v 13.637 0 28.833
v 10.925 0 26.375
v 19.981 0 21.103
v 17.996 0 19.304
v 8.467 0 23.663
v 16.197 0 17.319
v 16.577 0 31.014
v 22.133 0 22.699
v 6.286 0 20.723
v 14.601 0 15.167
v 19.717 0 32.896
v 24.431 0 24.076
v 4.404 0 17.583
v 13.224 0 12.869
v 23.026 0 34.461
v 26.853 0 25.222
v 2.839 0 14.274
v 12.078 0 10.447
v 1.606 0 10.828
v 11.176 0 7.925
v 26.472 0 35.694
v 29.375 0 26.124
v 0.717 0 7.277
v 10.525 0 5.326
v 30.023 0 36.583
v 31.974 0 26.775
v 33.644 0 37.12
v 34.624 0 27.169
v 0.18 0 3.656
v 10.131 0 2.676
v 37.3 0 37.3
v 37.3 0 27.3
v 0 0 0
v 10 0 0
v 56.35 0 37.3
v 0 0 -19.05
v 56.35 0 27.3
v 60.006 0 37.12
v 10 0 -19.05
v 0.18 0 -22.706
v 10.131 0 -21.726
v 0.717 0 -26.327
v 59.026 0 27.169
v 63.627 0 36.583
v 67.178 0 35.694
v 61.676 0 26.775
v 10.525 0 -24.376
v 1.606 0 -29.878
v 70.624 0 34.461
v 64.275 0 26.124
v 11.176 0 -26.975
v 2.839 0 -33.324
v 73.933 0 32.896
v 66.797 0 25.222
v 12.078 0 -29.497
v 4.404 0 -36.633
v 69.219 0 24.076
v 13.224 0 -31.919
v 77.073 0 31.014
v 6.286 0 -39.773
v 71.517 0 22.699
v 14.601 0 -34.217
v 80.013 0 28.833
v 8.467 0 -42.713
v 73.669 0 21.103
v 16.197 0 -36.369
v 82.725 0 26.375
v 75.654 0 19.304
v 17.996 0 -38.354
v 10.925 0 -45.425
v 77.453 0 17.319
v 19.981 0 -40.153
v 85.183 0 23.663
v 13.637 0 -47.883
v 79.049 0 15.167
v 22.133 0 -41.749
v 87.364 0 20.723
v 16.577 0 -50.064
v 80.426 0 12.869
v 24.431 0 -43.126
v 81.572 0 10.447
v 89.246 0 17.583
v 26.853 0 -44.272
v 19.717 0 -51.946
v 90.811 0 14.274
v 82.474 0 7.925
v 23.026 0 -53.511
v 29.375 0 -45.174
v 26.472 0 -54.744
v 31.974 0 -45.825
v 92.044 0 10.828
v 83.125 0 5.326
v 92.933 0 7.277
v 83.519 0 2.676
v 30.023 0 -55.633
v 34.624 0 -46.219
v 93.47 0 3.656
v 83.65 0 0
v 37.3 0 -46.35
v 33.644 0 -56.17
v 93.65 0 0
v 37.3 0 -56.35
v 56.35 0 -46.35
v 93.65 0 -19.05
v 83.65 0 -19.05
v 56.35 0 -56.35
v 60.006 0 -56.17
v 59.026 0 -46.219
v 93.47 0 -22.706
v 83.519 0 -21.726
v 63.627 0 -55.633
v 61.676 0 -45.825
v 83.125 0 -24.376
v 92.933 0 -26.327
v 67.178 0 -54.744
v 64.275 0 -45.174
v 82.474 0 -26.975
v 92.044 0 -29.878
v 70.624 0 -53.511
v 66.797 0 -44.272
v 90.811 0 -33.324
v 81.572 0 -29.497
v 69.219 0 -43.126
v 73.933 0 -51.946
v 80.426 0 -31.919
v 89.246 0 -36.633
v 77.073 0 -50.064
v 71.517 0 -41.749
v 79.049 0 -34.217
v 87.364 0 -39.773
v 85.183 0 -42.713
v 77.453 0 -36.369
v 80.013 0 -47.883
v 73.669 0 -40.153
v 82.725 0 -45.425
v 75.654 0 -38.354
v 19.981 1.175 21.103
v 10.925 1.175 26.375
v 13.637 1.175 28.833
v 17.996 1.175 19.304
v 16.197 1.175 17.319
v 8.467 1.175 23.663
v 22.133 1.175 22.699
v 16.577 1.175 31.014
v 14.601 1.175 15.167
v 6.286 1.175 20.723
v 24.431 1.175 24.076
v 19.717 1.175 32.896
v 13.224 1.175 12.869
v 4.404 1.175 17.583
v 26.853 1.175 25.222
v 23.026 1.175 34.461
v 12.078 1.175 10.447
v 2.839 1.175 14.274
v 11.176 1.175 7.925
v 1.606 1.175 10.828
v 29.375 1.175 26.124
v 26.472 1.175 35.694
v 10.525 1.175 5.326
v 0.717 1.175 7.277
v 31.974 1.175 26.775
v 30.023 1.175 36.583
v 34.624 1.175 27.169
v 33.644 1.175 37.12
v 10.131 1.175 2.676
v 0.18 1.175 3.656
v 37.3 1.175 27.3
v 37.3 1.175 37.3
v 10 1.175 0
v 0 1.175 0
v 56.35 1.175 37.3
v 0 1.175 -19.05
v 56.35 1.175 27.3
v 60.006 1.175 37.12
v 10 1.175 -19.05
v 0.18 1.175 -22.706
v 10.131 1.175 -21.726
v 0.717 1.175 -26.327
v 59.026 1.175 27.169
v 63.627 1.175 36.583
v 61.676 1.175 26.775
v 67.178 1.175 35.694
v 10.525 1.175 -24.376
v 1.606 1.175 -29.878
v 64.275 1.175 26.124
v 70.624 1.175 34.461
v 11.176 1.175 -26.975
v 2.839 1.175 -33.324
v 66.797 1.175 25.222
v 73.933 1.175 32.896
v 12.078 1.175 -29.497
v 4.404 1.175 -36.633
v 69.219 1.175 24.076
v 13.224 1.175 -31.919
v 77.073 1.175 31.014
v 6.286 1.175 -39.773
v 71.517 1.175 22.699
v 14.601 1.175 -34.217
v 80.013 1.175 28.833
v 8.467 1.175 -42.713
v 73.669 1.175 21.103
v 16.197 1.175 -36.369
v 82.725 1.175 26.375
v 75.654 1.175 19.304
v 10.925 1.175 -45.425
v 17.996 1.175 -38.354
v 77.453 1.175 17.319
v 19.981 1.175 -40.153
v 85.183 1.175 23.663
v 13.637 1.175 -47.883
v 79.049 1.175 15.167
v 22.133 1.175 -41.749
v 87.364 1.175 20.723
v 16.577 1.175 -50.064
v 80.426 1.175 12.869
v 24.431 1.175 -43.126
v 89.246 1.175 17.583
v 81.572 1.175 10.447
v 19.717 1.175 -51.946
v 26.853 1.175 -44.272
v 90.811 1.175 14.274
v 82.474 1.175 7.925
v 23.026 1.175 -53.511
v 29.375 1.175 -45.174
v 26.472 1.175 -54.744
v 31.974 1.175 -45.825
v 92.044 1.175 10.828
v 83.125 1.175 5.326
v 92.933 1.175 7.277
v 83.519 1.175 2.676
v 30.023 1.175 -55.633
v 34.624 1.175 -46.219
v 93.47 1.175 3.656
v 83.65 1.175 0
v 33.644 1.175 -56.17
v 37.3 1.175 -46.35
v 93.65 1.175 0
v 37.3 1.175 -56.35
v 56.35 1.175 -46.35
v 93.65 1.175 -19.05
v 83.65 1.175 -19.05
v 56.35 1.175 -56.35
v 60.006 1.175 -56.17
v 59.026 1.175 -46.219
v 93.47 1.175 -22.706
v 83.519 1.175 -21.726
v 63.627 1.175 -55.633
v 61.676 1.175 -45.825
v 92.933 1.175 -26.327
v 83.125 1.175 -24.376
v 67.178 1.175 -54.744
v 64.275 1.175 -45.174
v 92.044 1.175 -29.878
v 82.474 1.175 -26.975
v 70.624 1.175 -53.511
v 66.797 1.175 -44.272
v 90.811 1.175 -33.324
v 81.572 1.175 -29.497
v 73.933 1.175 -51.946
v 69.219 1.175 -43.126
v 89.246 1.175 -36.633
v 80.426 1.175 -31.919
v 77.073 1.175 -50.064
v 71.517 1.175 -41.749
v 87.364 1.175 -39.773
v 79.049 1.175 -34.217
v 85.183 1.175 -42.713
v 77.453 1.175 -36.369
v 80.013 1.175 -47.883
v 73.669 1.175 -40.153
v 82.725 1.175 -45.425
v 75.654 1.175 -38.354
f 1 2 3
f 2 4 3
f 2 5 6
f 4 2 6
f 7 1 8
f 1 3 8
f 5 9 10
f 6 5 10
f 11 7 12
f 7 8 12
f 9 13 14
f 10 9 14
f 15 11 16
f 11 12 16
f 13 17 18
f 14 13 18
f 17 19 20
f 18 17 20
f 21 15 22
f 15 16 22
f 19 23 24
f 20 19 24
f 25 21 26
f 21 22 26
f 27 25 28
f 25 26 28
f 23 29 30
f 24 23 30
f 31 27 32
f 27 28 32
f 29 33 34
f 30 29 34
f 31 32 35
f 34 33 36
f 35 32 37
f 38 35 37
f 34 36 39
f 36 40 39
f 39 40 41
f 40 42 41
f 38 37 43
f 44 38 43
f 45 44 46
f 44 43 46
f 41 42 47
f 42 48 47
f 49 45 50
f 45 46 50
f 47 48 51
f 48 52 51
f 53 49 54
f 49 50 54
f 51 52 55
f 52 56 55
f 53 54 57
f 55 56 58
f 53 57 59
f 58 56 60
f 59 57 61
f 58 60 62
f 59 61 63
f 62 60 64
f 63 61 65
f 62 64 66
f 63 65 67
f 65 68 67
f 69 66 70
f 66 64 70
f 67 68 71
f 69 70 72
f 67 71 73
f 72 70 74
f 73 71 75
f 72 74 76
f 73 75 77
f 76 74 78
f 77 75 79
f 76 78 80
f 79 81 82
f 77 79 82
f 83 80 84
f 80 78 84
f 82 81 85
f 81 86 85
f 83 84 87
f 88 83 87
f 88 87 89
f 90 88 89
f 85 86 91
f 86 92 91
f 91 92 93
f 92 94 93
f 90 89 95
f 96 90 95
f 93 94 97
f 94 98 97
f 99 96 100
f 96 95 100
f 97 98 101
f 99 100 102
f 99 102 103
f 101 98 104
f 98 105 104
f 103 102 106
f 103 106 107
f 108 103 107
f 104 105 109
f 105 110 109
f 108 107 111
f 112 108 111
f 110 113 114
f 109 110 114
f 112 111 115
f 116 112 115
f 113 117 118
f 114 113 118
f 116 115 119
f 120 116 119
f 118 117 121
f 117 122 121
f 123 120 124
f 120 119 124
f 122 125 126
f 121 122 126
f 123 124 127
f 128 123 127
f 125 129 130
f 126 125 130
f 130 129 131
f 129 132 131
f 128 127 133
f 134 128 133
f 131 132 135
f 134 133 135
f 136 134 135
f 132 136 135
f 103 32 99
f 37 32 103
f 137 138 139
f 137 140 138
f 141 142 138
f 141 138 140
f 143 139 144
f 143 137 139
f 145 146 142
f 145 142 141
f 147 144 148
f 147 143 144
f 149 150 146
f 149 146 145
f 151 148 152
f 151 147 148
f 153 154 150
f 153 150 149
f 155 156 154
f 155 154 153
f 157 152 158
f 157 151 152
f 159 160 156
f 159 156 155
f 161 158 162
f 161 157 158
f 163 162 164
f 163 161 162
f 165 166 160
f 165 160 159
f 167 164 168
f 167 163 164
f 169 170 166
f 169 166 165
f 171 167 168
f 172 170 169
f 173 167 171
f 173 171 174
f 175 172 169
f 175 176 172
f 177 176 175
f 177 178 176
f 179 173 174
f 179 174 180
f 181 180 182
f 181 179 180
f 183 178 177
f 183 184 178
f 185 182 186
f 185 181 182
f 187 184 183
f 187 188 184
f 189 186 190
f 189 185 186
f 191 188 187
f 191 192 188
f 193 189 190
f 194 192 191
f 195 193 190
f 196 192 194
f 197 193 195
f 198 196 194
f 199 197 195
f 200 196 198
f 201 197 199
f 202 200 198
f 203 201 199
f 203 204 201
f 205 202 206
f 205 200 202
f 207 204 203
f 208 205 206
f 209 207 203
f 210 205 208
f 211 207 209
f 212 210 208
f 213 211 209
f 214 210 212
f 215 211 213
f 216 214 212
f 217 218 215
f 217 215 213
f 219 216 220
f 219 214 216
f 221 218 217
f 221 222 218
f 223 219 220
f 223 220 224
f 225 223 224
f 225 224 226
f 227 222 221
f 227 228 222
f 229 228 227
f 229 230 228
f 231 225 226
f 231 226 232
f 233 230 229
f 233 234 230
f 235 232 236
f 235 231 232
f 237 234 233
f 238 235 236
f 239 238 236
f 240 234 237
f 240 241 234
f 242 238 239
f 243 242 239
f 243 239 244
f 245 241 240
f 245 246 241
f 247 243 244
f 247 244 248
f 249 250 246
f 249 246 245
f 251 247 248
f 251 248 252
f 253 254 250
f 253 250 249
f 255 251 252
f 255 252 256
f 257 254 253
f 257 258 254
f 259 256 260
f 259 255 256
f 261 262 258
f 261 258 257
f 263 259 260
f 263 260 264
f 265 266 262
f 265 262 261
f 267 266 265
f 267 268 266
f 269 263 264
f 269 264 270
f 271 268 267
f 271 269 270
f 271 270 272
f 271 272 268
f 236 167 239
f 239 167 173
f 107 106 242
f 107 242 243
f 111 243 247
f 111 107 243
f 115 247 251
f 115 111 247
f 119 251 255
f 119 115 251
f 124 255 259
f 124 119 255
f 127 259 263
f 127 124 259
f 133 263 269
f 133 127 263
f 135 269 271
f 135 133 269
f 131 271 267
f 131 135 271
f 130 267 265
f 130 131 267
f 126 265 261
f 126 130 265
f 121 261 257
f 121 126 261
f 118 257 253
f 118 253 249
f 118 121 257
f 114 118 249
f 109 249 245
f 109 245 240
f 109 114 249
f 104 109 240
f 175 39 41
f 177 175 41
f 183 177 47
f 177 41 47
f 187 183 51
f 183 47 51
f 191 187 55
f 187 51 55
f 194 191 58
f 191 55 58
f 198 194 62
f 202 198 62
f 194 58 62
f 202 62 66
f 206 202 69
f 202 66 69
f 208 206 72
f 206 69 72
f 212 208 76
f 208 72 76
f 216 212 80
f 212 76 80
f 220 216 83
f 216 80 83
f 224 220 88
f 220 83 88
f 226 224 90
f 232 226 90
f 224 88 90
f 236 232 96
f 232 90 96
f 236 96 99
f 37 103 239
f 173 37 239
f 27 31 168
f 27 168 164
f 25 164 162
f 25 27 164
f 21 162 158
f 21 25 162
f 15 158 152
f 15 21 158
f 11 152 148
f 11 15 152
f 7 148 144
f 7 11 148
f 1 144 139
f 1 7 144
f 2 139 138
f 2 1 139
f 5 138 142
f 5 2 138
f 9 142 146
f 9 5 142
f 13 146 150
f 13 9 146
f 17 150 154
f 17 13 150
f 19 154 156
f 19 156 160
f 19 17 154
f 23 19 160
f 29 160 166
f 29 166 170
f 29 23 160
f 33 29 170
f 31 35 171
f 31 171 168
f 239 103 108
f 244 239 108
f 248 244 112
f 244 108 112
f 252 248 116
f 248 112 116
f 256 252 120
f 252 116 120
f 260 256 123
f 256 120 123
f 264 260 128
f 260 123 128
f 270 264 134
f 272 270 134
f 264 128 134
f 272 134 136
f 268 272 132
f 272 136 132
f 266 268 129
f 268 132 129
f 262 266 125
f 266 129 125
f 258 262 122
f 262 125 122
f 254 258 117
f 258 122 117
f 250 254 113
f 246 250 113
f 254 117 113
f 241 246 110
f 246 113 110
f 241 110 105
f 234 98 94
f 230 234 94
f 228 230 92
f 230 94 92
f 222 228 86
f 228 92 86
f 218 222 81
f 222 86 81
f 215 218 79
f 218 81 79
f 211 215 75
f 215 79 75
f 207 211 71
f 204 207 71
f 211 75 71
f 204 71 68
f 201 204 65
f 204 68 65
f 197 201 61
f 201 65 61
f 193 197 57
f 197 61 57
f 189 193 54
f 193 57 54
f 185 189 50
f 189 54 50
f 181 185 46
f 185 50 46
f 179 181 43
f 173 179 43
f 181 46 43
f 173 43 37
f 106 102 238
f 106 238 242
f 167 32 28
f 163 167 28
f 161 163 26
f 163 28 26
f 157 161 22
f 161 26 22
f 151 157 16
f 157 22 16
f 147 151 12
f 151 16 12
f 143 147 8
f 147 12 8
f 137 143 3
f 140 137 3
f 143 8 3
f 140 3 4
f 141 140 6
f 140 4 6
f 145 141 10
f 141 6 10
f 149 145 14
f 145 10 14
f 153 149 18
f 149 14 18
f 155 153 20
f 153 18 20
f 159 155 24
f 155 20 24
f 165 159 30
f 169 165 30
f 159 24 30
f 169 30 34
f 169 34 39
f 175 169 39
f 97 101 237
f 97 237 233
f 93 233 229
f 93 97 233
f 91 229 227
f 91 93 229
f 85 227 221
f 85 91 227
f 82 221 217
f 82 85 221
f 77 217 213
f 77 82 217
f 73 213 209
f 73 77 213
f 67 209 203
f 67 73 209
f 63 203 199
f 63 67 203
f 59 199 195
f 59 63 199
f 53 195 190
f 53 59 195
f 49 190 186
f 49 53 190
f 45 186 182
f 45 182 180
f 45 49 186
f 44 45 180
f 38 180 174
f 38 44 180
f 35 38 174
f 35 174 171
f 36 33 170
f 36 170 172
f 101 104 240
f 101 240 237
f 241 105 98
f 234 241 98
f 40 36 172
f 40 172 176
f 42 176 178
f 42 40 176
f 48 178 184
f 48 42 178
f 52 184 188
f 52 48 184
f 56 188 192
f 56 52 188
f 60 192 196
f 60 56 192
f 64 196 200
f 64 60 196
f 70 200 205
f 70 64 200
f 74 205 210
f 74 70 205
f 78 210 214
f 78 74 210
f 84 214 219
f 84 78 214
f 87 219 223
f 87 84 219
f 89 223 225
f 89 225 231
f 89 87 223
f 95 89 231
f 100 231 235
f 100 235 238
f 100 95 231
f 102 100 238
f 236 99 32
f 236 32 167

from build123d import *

# Parameters (mm, degrees)
BOSS_EXTRUDE1_DEPTH = 1.175
BOSS_EXTRUDE2_REACH = 127.575
SKETCH4_W           = 19.05
SKETCH4_H           = 1.175


with BuildPart() as part:
    # Sketch1 → Boss-Extrude1 (new body)
    with BuildSketch(Plane(origin=(0, 0, 0), x_dir=(1, 0, 0), z_dir=(0, 1, 0))):
        with BuildLine():
            Line((0, 0), (0, 19.05))
            ThreePointArc((0, 19.05), (10.924917062, 45.425082938), (37.3, 56.35))
            Line((37.3, 56.35), (56.35, 56.35))
            ThreePointArc((56.35, 56.35), (82.725082938, 45.425082938), (93.65, 19.05))
            Line((93.65, 19.05), (93.65, 0))
            ThreePointArc((93.65, 0), (82.725082938, -26.375082938), (56.35, -37.3))
            Line((56.35, -37.3), (37.3, -37.3))
            ThreePointArc((37.3, -37.3), (10.924917062, -26.375082938), (0, 0))
        make_face()
        with BuildLine():
            Line((10, 0), (10, 19.05))
            ThreePointArc((10, 19.05), (17.995984874, 38.354015126), (37.3, 46.35))
            Line((37.3, 46.35), (56.35, 46.35))
            ThreePointArc((56.35, 46.35), (75.654015126, 38.354015126), (83.65, 19.05))
            Line((83.65, 19.05), (83.65, 0))
            ThreePointArc((83.65, 0), (75.654015126, -19.304015126), (56.35, -27.3))
            Line((56.35, -27.3), (37.3, -27.3))
            ThreePointArc((37.3, -27.3), (17.995984874, -19.304015126), (10, 0))
        make_face(mode=Mode.SUBTRACT)
    extrude(amount=BOSS_EXTRUDE1_DEPTH)

    # Boss-Extrude2: up to this face of the body (flat: up to its plane)
    boss_extrude2_end = Plane(part.part.faces().sort_by_distance((46.825, 0.5875, 27.3))[0])
    # Sketch4 → Boss-Extrude2 (add, up to the picked face)
    with BuildSketch(Plane.XY.offset(-46.35), mode=Mode.PRIVATE) as boss_extrude2_sk1:
        with Locations((46.825, 0.5875)):
            Rectangle(SKETCH4_W, SKETCH4_H)
    boss_extrude2_tool1 = split(extrude(boss_extrude2_sk1.sketch, amount=BOSS_EXTRUDE2_REACH, mode=Mode.PRIVATE), bisect_by=boss_extrude2_end, keep=Keep.BOTH, mode=Mode.PRIVATE)
    add(boss_extrude2_tool1.solids().sort_by(Axis((46.825, 0.5875, -46.35), (0, 0, 1)))[0])


solid = part.part
